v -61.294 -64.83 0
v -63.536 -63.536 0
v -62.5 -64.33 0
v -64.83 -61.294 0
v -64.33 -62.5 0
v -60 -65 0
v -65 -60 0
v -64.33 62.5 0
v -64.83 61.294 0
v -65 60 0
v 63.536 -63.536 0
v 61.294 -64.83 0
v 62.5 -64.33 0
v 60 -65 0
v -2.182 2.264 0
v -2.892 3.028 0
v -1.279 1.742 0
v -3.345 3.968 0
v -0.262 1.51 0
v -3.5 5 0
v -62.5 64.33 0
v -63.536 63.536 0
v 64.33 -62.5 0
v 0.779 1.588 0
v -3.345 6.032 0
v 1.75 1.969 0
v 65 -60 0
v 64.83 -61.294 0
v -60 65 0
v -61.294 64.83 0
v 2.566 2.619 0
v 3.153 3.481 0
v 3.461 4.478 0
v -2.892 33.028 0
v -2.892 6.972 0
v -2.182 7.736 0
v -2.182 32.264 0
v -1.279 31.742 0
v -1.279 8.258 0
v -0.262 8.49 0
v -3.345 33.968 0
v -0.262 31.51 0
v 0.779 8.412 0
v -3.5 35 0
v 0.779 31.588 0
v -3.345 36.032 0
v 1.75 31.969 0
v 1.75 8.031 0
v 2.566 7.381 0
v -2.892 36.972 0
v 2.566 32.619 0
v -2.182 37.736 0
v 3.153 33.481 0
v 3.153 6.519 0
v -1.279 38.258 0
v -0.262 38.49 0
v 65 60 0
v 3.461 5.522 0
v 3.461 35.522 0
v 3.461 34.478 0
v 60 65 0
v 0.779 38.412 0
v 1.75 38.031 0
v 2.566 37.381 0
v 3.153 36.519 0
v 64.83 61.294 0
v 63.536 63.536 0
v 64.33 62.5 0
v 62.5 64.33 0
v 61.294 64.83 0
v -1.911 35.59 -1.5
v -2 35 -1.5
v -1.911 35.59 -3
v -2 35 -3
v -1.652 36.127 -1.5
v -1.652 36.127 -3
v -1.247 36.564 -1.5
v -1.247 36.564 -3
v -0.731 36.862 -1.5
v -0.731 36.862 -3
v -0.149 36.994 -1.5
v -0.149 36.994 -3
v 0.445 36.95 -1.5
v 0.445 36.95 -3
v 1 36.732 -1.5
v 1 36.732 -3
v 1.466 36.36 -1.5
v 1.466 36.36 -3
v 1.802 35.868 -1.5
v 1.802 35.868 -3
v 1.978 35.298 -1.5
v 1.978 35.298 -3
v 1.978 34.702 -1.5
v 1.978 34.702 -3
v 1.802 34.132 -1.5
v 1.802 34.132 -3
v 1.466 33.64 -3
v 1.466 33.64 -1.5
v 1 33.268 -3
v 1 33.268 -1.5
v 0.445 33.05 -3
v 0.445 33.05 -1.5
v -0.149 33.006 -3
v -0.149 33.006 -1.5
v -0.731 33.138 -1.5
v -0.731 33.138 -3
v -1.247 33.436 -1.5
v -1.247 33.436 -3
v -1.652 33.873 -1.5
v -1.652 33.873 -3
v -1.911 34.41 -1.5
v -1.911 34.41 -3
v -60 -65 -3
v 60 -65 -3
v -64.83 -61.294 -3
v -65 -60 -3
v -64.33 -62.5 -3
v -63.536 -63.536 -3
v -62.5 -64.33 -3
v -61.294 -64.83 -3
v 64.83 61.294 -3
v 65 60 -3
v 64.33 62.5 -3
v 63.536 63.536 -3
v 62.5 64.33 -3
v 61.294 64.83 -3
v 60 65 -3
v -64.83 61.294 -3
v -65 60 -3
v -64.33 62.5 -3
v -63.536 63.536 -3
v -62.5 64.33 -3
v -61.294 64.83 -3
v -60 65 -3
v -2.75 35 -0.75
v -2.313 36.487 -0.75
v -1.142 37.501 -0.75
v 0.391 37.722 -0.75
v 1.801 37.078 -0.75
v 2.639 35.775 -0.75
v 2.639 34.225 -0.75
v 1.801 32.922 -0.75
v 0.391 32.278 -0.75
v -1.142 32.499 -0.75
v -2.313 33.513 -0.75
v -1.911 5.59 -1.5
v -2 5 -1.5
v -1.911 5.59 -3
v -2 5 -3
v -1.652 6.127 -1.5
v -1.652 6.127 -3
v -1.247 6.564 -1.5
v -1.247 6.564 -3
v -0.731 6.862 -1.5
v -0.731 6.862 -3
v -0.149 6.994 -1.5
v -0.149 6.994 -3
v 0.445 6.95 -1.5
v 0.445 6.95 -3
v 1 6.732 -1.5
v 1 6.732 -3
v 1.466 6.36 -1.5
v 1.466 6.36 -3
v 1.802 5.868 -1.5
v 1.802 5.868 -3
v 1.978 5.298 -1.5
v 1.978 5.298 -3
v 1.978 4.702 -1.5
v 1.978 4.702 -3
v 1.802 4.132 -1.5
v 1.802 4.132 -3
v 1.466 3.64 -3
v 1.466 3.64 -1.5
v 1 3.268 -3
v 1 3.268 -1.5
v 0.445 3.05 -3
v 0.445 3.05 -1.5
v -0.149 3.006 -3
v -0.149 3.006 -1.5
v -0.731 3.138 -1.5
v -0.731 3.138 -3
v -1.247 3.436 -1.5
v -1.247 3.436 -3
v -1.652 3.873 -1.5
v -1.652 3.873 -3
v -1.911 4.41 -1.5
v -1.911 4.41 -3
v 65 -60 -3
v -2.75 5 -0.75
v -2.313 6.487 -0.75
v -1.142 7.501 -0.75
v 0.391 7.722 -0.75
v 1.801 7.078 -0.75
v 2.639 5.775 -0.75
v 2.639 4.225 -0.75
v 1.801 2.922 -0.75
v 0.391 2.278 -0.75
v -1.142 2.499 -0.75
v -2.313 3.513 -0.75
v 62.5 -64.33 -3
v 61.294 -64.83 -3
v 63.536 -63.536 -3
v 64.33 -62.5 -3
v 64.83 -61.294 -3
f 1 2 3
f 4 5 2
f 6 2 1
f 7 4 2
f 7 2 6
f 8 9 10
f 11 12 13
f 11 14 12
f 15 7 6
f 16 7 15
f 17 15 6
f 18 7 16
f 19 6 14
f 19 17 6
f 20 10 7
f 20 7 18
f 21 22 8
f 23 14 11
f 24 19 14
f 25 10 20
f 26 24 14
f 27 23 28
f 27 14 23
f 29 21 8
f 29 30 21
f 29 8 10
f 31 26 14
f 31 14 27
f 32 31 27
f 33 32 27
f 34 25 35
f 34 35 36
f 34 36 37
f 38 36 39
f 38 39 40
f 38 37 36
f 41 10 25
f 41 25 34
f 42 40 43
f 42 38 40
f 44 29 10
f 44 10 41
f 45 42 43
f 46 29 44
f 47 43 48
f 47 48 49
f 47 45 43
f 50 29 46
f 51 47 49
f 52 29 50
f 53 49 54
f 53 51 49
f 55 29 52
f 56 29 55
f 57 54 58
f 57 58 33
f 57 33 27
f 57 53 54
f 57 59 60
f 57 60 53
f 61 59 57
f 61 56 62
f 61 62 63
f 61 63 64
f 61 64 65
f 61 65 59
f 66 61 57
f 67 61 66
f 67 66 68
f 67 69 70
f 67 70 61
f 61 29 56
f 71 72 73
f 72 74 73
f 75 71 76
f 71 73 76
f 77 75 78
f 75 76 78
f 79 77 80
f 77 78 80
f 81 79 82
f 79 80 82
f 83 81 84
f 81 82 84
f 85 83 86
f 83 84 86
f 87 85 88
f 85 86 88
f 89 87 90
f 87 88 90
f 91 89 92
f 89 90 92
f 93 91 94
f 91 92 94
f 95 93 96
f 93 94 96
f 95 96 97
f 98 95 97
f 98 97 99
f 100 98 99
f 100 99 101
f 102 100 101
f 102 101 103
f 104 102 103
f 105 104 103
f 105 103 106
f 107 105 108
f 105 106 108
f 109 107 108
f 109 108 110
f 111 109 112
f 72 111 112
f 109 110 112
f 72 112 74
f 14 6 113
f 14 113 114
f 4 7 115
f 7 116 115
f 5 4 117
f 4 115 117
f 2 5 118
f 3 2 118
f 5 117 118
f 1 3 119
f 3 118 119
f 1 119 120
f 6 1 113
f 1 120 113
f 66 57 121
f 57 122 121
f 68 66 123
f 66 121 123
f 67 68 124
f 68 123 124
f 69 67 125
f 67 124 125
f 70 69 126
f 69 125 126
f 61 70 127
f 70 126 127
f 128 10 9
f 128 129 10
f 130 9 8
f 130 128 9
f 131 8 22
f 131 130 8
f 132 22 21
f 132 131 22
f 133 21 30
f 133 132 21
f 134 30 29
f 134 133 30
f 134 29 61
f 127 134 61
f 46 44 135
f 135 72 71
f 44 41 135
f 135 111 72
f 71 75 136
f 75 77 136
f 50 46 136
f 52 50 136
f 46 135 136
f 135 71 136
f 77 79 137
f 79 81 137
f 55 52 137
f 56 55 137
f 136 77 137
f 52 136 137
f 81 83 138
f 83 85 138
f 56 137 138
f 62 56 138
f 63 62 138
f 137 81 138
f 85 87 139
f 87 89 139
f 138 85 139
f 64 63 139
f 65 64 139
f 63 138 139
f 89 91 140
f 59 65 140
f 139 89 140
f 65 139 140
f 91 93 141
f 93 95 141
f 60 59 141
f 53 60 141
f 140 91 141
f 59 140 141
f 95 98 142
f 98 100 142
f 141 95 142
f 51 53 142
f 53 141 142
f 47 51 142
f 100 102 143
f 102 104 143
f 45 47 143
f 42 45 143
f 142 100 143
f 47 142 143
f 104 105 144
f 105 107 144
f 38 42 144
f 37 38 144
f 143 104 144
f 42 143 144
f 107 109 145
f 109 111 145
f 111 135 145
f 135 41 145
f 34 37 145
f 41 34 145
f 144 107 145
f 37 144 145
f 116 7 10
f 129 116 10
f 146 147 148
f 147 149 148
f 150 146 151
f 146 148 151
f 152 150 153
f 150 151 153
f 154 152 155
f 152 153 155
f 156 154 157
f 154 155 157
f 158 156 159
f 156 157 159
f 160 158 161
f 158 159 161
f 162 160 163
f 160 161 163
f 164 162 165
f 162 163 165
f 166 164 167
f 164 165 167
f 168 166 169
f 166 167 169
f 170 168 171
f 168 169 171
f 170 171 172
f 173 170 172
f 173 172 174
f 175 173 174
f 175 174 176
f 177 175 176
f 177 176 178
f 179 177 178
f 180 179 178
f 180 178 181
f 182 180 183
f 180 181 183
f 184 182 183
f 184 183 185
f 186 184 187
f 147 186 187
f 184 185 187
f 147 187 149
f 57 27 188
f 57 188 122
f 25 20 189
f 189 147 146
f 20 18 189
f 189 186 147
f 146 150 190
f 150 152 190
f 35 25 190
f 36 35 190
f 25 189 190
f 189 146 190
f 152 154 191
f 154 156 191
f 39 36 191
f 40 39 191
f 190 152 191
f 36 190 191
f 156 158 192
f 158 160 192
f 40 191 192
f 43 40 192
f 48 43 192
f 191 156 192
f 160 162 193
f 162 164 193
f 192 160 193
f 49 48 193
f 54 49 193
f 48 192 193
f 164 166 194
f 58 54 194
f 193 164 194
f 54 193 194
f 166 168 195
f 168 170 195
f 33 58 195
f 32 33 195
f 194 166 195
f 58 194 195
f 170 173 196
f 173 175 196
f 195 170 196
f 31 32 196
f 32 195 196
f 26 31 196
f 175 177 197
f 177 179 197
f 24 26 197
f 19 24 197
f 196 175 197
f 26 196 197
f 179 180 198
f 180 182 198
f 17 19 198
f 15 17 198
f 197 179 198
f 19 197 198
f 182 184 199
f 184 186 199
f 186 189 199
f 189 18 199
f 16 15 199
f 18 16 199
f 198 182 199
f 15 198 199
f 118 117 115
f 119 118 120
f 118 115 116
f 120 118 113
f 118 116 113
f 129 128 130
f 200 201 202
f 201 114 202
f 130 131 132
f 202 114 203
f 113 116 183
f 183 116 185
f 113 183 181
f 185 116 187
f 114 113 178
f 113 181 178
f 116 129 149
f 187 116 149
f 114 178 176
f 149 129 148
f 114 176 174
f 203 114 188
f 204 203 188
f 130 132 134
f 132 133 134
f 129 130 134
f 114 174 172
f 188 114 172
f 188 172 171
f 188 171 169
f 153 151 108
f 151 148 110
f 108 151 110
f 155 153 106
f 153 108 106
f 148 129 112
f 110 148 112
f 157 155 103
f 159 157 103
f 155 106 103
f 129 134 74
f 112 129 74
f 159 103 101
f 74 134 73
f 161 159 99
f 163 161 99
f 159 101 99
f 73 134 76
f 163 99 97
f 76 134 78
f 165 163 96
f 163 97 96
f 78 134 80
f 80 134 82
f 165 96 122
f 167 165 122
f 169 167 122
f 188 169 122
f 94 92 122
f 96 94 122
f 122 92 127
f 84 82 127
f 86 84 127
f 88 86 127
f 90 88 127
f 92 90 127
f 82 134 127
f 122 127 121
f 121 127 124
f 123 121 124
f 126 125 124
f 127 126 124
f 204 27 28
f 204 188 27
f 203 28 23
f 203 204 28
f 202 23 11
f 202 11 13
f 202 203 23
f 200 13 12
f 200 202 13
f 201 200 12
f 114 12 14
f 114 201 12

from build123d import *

# Parameters (mm, degrees)
F0_W           = 130
F0_H           = 130
F1_DEPTH       = 3
F2_D           = 4
F2_CSINK_D     = 7
F2_CSINK_ANGLE = 90
F3_R           = 5


with BuildPart() as f1:
    # F0 (on Top) → F1 (new body)
    with BuildSketch(Plane.XY):
        Rectangle(F0_W, F0_H)
    extrude(amount=-F1_DEPTH)

    # F2 (through all)
    with Locations(Plane.XY):
        with Locations((0, 35), (0, 5)):
            CounterSinkHole(F2_D / 2, F2_CSINK_D / 2, counter_sink_angle=F2_CSINK_ANGLE)

    # F3
    f3_edges = [f1.edges().sort_by_distance(p)[0] for p in [
        (-65, 65, -1.5),
        (65, 65, -1.5),
        (65, -65, -1.5),
        (-65, -65, -1.5),
    ]]
    fillet(f3_edges, radius=F3_R)


solid = f1.part
